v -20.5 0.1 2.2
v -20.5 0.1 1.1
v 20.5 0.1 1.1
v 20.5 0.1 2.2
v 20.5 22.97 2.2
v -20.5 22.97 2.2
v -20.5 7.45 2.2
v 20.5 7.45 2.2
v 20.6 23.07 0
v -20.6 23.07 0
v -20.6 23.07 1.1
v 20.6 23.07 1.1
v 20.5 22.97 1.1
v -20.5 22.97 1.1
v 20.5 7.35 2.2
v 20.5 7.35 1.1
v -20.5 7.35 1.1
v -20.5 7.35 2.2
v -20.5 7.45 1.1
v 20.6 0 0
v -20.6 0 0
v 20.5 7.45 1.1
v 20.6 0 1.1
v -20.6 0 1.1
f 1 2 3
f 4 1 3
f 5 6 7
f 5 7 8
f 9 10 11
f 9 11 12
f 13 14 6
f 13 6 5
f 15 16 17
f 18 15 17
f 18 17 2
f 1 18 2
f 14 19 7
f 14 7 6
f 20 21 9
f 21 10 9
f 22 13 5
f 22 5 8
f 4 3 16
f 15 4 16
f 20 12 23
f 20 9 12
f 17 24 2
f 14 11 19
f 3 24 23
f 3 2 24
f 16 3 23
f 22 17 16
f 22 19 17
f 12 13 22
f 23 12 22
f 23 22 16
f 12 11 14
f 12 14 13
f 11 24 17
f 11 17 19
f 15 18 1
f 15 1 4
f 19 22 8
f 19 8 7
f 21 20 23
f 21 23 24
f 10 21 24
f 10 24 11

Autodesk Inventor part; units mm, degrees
ref_plane "YZ Plane" through (0, 0, 0) normal (1, 0, 0) x (0, 1, 0)
ref_plane "XZ Plane" through (0, 0, 0) normal (0, 1, 0) x (-1, 0, 0)
ref_plane "XY Plane" through (0, 0, 0) normal (0, 0, 1) x (1, 0, 0)
sketch "スケッチ1" plane through (0, 0, 0) normal (0, 0, 1) x (1, 0, 0)
  line L0 (-20.6, 23.07) -> (20.6, 23.07)
  line L1 (20.6, 23.07) -> (20.6, 0)
  line L2 (20.6, 0) -> (-20.6, 0)
  line L3 (-20.6, 0) -> (-20.6, 23.07)
  point P0 (0, 0)
  point P1 (0, 0)
  dimension "d0" = 41.2
  dimension "d1" = 23.07
extrude "押し出し1" add sketch "スケッチ1" along normal blind 1.1
sketch "スケッチ3" plane through (0, 0, 1.1) normal (0, 0, 1) x (1, 0, 0)
  line L0 (-20.5, 0.1) -> (20.5, 0.1)
  line L1 (20.5, 0.1) -> (20.5, 7.35)
  line L2 (20.5, 7.35) -> (-20.5, 7.35)
  line L3 (-20.5, 7.35) -> (-20.5, 0.1)
  line L4 (-20.6, 23.07) -> (-20.6, 0) projected
  line L5 (-20.6, 0) -> (20.6, 0) projected
  line L6 (20.6, 0) -> (20.6, 23.07) projected
  point P0 (0, 0)
  dimension "d6" = 7.25
  dimension "d7" = 0.1
  dimension "d8" = 0.1
  dimension "d9" = 0.1
extrude "押し出し2" add sketch "スケッチ3" along normal blind 1.1
sketch "スケッチ4" plane through (0, 0, 1.1) normal (0, 0, 1) x (1, 0, 0)
  line L0 (-20.5, 22.97) -> (20.5, 22.97)
  line L1 (20.5, 22.97) -> (20.5, 7.45)
  line L2 (20.5, 7.45) -> (-20.5, 7.45)
  line L3 (-20.5, 7.45) -> (-20.5, 22.97)
  line L4 (20.6, 23.07) -> (-20.6, 23.07) projected
  line L5 (20.5, 7.35) -> (-20.5, 7.35) projected
  line L6 (-20.5, 7.35) -> (-20.5, 0.1) projected
  line L7 (20.5, 0.1) -> (20.5, 7.35) projected
  point P0 (0, 0)
  dimension "d12" = 0.1
  dimension "d13" = 0.1
extrude "押し出し3" add sketch "スケッチ4" along normal blind 1.1
equation "\"d8\" = d7"
equation "\"d9\" = d7"
equation "\"d13\" = d12"
properties part number "AQM1602Y"
